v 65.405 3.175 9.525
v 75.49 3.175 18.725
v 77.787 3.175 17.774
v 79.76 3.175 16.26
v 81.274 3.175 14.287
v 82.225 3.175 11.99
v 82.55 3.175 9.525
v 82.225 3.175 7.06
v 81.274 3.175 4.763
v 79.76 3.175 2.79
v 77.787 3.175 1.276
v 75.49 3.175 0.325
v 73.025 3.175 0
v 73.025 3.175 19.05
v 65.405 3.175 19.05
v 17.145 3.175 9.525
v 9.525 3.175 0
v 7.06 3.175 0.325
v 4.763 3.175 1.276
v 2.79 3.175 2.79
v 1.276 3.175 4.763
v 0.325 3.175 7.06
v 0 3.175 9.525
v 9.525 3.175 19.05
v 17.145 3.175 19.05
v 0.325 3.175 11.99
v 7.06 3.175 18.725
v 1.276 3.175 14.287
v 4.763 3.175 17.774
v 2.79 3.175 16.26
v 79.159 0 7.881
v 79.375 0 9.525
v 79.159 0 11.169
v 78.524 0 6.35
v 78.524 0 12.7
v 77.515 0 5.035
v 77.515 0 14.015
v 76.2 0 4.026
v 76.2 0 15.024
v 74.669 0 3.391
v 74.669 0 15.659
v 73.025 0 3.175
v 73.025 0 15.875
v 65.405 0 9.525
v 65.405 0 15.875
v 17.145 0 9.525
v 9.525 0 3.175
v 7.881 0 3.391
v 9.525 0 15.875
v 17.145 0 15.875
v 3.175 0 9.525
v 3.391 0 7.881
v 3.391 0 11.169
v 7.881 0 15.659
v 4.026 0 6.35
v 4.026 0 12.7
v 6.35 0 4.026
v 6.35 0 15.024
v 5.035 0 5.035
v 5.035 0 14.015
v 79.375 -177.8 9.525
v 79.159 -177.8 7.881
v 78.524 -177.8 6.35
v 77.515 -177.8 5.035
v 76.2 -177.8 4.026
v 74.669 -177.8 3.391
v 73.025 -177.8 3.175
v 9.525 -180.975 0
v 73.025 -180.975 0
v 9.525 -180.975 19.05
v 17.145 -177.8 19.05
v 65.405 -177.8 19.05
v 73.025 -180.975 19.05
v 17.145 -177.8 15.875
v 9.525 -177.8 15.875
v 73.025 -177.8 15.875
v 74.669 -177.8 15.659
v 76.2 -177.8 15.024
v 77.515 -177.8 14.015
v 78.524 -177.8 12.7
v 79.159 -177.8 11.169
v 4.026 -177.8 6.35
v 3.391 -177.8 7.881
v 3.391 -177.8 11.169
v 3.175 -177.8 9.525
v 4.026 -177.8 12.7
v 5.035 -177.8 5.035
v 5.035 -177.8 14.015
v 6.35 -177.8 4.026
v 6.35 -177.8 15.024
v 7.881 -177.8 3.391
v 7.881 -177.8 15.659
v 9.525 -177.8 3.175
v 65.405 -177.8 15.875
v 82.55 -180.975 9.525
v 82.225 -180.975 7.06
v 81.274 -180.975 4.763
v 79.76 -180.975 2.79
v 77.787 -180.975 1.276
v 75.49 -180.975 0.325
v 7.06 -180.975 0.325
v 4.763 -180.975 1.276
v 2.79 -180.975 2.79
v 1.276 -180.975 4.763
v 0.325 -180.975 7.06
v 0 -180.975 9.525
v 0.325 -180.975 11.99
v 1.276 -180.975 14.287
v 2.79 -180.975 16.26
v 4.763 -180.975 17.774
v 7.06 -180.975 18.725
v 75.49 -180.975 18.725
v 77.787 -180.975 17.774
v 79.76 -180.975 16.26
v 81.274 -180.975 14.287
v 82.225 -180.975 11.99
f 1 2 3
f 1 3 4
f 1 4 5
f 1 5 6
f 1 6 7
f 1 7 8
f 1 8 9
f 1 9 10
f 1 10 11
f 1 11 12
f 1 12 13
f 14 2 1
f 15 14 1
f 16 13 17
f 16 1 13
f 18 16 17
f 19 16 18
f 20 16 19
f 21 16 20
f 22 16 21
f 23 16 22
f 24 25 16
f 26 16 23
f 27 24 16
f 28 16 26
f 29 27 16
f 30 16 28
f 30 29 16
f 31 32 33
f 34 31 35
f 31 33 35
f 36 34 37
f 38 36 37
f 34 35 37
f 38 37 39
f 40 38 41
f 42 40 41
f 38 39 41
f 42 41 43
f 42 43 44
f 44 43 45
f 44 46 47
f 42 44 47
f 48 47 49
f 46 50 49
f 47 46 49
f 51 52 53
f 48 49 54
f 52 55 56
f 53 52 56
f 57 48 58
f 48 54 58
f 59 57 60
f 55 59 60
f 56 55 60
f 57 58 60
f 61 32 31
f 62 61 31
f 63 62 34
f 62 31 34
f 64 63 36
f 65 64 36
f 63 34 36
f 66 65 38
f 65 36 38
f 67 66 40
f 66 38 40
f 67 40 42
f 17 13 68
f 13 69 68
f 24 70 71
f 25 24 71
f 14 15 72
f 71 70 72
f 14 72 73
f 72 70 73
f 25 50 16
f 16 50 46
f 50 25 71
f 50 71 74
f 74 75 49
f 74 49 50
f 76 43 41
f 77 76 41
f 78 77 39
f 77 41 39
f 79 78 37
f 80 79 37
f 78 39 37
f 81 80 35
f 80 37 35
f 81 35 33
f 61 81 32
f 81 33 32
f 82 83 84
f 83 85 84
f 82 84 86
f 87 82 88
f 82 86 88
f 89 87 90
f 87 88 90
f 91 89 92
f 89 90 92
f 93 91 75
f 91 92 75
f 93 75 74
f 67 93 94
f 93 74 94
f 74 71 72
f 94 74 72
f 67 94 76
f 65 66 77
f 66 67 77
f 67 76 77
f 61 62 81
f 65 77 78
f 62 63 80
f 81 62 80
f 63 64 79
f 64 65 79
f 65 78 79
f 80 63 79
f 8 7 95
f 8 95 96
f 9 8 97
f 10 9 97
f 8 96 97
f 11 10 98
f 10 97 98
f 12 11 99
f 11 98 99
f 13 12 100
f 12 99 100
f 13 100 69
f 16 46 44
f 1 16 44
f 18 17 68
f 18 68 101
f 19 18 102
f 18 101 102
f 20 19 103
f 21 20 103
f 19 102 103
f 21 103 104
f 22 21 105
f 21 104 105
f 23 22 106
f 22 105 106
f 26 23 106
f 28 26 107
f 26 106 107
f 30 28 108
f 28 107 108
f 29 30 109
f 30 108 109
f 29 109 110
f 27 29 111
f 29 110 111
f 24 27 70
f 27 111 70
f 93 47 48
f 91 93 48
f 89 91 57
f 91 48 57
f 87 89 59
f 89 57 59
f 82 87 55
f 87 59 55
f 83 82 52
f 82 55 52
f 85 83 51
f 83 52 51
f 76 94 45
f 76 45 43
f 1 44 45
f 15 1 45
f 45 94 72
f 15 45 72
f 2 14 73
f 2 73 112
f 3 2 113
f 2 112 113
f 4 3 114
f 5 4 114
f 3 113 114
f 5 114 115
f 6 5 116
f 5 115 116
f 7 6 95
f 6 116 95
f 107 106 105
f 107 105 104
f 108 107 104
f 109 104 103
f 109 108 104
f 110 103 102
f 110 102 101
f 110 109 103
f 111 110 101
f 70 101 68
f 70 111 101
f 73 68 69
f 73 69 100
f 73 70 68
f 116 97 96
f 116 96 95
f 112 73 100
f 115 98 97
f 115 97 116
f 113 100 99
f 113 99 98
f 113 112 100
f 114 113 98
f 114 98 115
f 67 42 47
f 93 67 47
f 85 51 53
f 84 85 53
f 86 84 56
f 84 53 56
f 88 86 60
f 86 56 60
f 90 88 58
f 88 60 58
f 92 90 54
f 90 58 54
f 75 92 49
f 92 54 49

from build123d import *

# Parameters (mm, degrees)
F1_DEPTH = 177.8
F3_DEPTH = 3.175
F5_DEPTH = 3.175


with BuildPart() as f1:
    # F0 (on Front) → F1 (new body)
    with BuildSketch(Plane.XZ):
        with BuildLine():
            ThreePointArc((0, 9.525), (2.789808, 2.789808), (9.525, 0))
            Line((9.525, 0), (73.025, 0))
            ThreePointArc((73.025, 0), (79.760192, 2.789808), (82.55, 9.525))
            ThreePointArc((82.55, 9.525), (79.760192, 16.260192), (73.025, 19.05))
            Line((73.025, 19.05), (65.405, 19.05))
            Line((65.405, 19.05), (65.405, 15.875))
            Line((65.405, 15.875), (73.025, 15.875))
            ThreePointArc((73.025, 15.875), (77.515128, 14.015128), (79.375, 9.525))
            ThreePointArc((79.375, 9.525), (77.515128, 5.034872), (73.025, 3.175))
            Line((73.025, 3.175), (9.525, 3.175))
            ThreePointArc((9.525, 3.175), (5.034872, 5.034872), (3.175, 9.525))
            ThreePointArc((3.175, 9.525), (5.034872, 14.015128), (9.525, 15.875))
            Line((9.525, 15.875), (17.145, 15.875))
            Line((17.145, 15.875), (17.145, 19.05))
            Line((17.145, 19.05), (9.525, 19.05))
            ThreePointArc((9.525, 19.05), (2.789808, 16.260192), (0, 9.525))
        make_face()
    extrude(amount=F1_DEPTH)

    # F2 (on face) → F3 (join)
    with BuildSketch(Plane.XZ.offset(177.8)):
        with BuildLine():
            Line((73.025, 19.05), (9.525, 19.05))
            ThreePointArc((9.525, 19.05), (2.789808, 16.260192), (0, 9.525))
            ThreePointArc((0, 9.525), (2.789808, 2.789808), (9.525, 0))
            Line((9.525, 0), (73.025, 0))
            ThreePointArc((73.025, 0), (79.760192, 2.789808), (82.55, 9.525))
            ThreePointArc((82.55, 9.525), (79.760192, 16.260192), (73.025, 19.05))
        make_face()
    extrude(amount=F3_DEPTH)

    # F4 (on face) → F5 (join)
    with BuildSketch(Plane(origin=(0, 0, 0), x_dir=(-1, 0, 0), z_dir=(0, 1, 0))):
        with BuildLine():
            Line((-65.405, 9.525), (-65.405, 19.05))
            Line((-65.405, 19.05), (-73.025, 19.05))
            ThreePointArc((-73.025, 19.05), (-79.760192, 16.260192), (-82.55, 9.525))
            ThreePointArc((-82.55, 9.525), (-79.760192, 2.789808), (-73.025, 0))
            Line((-73.025, 0), (-9.525, 0))
            ThreePointArc((-9.525, 0), (-2.789808, 2.789808), (0, 9.525))
            ThreePointArc((0, 9.525), (-2.789808, 16.260192), (-9.525, 19.05))
            Line((-9.525, 19.05), (-17.145, 19.05))
            Line((-17.145, 19.05), (-17.145, 9.525))
            Line((-17.145, 9.525), (-65.405, 9.525))
        make_face()
    extrude(amount=F5_DEPTH)


solid = f1.part
